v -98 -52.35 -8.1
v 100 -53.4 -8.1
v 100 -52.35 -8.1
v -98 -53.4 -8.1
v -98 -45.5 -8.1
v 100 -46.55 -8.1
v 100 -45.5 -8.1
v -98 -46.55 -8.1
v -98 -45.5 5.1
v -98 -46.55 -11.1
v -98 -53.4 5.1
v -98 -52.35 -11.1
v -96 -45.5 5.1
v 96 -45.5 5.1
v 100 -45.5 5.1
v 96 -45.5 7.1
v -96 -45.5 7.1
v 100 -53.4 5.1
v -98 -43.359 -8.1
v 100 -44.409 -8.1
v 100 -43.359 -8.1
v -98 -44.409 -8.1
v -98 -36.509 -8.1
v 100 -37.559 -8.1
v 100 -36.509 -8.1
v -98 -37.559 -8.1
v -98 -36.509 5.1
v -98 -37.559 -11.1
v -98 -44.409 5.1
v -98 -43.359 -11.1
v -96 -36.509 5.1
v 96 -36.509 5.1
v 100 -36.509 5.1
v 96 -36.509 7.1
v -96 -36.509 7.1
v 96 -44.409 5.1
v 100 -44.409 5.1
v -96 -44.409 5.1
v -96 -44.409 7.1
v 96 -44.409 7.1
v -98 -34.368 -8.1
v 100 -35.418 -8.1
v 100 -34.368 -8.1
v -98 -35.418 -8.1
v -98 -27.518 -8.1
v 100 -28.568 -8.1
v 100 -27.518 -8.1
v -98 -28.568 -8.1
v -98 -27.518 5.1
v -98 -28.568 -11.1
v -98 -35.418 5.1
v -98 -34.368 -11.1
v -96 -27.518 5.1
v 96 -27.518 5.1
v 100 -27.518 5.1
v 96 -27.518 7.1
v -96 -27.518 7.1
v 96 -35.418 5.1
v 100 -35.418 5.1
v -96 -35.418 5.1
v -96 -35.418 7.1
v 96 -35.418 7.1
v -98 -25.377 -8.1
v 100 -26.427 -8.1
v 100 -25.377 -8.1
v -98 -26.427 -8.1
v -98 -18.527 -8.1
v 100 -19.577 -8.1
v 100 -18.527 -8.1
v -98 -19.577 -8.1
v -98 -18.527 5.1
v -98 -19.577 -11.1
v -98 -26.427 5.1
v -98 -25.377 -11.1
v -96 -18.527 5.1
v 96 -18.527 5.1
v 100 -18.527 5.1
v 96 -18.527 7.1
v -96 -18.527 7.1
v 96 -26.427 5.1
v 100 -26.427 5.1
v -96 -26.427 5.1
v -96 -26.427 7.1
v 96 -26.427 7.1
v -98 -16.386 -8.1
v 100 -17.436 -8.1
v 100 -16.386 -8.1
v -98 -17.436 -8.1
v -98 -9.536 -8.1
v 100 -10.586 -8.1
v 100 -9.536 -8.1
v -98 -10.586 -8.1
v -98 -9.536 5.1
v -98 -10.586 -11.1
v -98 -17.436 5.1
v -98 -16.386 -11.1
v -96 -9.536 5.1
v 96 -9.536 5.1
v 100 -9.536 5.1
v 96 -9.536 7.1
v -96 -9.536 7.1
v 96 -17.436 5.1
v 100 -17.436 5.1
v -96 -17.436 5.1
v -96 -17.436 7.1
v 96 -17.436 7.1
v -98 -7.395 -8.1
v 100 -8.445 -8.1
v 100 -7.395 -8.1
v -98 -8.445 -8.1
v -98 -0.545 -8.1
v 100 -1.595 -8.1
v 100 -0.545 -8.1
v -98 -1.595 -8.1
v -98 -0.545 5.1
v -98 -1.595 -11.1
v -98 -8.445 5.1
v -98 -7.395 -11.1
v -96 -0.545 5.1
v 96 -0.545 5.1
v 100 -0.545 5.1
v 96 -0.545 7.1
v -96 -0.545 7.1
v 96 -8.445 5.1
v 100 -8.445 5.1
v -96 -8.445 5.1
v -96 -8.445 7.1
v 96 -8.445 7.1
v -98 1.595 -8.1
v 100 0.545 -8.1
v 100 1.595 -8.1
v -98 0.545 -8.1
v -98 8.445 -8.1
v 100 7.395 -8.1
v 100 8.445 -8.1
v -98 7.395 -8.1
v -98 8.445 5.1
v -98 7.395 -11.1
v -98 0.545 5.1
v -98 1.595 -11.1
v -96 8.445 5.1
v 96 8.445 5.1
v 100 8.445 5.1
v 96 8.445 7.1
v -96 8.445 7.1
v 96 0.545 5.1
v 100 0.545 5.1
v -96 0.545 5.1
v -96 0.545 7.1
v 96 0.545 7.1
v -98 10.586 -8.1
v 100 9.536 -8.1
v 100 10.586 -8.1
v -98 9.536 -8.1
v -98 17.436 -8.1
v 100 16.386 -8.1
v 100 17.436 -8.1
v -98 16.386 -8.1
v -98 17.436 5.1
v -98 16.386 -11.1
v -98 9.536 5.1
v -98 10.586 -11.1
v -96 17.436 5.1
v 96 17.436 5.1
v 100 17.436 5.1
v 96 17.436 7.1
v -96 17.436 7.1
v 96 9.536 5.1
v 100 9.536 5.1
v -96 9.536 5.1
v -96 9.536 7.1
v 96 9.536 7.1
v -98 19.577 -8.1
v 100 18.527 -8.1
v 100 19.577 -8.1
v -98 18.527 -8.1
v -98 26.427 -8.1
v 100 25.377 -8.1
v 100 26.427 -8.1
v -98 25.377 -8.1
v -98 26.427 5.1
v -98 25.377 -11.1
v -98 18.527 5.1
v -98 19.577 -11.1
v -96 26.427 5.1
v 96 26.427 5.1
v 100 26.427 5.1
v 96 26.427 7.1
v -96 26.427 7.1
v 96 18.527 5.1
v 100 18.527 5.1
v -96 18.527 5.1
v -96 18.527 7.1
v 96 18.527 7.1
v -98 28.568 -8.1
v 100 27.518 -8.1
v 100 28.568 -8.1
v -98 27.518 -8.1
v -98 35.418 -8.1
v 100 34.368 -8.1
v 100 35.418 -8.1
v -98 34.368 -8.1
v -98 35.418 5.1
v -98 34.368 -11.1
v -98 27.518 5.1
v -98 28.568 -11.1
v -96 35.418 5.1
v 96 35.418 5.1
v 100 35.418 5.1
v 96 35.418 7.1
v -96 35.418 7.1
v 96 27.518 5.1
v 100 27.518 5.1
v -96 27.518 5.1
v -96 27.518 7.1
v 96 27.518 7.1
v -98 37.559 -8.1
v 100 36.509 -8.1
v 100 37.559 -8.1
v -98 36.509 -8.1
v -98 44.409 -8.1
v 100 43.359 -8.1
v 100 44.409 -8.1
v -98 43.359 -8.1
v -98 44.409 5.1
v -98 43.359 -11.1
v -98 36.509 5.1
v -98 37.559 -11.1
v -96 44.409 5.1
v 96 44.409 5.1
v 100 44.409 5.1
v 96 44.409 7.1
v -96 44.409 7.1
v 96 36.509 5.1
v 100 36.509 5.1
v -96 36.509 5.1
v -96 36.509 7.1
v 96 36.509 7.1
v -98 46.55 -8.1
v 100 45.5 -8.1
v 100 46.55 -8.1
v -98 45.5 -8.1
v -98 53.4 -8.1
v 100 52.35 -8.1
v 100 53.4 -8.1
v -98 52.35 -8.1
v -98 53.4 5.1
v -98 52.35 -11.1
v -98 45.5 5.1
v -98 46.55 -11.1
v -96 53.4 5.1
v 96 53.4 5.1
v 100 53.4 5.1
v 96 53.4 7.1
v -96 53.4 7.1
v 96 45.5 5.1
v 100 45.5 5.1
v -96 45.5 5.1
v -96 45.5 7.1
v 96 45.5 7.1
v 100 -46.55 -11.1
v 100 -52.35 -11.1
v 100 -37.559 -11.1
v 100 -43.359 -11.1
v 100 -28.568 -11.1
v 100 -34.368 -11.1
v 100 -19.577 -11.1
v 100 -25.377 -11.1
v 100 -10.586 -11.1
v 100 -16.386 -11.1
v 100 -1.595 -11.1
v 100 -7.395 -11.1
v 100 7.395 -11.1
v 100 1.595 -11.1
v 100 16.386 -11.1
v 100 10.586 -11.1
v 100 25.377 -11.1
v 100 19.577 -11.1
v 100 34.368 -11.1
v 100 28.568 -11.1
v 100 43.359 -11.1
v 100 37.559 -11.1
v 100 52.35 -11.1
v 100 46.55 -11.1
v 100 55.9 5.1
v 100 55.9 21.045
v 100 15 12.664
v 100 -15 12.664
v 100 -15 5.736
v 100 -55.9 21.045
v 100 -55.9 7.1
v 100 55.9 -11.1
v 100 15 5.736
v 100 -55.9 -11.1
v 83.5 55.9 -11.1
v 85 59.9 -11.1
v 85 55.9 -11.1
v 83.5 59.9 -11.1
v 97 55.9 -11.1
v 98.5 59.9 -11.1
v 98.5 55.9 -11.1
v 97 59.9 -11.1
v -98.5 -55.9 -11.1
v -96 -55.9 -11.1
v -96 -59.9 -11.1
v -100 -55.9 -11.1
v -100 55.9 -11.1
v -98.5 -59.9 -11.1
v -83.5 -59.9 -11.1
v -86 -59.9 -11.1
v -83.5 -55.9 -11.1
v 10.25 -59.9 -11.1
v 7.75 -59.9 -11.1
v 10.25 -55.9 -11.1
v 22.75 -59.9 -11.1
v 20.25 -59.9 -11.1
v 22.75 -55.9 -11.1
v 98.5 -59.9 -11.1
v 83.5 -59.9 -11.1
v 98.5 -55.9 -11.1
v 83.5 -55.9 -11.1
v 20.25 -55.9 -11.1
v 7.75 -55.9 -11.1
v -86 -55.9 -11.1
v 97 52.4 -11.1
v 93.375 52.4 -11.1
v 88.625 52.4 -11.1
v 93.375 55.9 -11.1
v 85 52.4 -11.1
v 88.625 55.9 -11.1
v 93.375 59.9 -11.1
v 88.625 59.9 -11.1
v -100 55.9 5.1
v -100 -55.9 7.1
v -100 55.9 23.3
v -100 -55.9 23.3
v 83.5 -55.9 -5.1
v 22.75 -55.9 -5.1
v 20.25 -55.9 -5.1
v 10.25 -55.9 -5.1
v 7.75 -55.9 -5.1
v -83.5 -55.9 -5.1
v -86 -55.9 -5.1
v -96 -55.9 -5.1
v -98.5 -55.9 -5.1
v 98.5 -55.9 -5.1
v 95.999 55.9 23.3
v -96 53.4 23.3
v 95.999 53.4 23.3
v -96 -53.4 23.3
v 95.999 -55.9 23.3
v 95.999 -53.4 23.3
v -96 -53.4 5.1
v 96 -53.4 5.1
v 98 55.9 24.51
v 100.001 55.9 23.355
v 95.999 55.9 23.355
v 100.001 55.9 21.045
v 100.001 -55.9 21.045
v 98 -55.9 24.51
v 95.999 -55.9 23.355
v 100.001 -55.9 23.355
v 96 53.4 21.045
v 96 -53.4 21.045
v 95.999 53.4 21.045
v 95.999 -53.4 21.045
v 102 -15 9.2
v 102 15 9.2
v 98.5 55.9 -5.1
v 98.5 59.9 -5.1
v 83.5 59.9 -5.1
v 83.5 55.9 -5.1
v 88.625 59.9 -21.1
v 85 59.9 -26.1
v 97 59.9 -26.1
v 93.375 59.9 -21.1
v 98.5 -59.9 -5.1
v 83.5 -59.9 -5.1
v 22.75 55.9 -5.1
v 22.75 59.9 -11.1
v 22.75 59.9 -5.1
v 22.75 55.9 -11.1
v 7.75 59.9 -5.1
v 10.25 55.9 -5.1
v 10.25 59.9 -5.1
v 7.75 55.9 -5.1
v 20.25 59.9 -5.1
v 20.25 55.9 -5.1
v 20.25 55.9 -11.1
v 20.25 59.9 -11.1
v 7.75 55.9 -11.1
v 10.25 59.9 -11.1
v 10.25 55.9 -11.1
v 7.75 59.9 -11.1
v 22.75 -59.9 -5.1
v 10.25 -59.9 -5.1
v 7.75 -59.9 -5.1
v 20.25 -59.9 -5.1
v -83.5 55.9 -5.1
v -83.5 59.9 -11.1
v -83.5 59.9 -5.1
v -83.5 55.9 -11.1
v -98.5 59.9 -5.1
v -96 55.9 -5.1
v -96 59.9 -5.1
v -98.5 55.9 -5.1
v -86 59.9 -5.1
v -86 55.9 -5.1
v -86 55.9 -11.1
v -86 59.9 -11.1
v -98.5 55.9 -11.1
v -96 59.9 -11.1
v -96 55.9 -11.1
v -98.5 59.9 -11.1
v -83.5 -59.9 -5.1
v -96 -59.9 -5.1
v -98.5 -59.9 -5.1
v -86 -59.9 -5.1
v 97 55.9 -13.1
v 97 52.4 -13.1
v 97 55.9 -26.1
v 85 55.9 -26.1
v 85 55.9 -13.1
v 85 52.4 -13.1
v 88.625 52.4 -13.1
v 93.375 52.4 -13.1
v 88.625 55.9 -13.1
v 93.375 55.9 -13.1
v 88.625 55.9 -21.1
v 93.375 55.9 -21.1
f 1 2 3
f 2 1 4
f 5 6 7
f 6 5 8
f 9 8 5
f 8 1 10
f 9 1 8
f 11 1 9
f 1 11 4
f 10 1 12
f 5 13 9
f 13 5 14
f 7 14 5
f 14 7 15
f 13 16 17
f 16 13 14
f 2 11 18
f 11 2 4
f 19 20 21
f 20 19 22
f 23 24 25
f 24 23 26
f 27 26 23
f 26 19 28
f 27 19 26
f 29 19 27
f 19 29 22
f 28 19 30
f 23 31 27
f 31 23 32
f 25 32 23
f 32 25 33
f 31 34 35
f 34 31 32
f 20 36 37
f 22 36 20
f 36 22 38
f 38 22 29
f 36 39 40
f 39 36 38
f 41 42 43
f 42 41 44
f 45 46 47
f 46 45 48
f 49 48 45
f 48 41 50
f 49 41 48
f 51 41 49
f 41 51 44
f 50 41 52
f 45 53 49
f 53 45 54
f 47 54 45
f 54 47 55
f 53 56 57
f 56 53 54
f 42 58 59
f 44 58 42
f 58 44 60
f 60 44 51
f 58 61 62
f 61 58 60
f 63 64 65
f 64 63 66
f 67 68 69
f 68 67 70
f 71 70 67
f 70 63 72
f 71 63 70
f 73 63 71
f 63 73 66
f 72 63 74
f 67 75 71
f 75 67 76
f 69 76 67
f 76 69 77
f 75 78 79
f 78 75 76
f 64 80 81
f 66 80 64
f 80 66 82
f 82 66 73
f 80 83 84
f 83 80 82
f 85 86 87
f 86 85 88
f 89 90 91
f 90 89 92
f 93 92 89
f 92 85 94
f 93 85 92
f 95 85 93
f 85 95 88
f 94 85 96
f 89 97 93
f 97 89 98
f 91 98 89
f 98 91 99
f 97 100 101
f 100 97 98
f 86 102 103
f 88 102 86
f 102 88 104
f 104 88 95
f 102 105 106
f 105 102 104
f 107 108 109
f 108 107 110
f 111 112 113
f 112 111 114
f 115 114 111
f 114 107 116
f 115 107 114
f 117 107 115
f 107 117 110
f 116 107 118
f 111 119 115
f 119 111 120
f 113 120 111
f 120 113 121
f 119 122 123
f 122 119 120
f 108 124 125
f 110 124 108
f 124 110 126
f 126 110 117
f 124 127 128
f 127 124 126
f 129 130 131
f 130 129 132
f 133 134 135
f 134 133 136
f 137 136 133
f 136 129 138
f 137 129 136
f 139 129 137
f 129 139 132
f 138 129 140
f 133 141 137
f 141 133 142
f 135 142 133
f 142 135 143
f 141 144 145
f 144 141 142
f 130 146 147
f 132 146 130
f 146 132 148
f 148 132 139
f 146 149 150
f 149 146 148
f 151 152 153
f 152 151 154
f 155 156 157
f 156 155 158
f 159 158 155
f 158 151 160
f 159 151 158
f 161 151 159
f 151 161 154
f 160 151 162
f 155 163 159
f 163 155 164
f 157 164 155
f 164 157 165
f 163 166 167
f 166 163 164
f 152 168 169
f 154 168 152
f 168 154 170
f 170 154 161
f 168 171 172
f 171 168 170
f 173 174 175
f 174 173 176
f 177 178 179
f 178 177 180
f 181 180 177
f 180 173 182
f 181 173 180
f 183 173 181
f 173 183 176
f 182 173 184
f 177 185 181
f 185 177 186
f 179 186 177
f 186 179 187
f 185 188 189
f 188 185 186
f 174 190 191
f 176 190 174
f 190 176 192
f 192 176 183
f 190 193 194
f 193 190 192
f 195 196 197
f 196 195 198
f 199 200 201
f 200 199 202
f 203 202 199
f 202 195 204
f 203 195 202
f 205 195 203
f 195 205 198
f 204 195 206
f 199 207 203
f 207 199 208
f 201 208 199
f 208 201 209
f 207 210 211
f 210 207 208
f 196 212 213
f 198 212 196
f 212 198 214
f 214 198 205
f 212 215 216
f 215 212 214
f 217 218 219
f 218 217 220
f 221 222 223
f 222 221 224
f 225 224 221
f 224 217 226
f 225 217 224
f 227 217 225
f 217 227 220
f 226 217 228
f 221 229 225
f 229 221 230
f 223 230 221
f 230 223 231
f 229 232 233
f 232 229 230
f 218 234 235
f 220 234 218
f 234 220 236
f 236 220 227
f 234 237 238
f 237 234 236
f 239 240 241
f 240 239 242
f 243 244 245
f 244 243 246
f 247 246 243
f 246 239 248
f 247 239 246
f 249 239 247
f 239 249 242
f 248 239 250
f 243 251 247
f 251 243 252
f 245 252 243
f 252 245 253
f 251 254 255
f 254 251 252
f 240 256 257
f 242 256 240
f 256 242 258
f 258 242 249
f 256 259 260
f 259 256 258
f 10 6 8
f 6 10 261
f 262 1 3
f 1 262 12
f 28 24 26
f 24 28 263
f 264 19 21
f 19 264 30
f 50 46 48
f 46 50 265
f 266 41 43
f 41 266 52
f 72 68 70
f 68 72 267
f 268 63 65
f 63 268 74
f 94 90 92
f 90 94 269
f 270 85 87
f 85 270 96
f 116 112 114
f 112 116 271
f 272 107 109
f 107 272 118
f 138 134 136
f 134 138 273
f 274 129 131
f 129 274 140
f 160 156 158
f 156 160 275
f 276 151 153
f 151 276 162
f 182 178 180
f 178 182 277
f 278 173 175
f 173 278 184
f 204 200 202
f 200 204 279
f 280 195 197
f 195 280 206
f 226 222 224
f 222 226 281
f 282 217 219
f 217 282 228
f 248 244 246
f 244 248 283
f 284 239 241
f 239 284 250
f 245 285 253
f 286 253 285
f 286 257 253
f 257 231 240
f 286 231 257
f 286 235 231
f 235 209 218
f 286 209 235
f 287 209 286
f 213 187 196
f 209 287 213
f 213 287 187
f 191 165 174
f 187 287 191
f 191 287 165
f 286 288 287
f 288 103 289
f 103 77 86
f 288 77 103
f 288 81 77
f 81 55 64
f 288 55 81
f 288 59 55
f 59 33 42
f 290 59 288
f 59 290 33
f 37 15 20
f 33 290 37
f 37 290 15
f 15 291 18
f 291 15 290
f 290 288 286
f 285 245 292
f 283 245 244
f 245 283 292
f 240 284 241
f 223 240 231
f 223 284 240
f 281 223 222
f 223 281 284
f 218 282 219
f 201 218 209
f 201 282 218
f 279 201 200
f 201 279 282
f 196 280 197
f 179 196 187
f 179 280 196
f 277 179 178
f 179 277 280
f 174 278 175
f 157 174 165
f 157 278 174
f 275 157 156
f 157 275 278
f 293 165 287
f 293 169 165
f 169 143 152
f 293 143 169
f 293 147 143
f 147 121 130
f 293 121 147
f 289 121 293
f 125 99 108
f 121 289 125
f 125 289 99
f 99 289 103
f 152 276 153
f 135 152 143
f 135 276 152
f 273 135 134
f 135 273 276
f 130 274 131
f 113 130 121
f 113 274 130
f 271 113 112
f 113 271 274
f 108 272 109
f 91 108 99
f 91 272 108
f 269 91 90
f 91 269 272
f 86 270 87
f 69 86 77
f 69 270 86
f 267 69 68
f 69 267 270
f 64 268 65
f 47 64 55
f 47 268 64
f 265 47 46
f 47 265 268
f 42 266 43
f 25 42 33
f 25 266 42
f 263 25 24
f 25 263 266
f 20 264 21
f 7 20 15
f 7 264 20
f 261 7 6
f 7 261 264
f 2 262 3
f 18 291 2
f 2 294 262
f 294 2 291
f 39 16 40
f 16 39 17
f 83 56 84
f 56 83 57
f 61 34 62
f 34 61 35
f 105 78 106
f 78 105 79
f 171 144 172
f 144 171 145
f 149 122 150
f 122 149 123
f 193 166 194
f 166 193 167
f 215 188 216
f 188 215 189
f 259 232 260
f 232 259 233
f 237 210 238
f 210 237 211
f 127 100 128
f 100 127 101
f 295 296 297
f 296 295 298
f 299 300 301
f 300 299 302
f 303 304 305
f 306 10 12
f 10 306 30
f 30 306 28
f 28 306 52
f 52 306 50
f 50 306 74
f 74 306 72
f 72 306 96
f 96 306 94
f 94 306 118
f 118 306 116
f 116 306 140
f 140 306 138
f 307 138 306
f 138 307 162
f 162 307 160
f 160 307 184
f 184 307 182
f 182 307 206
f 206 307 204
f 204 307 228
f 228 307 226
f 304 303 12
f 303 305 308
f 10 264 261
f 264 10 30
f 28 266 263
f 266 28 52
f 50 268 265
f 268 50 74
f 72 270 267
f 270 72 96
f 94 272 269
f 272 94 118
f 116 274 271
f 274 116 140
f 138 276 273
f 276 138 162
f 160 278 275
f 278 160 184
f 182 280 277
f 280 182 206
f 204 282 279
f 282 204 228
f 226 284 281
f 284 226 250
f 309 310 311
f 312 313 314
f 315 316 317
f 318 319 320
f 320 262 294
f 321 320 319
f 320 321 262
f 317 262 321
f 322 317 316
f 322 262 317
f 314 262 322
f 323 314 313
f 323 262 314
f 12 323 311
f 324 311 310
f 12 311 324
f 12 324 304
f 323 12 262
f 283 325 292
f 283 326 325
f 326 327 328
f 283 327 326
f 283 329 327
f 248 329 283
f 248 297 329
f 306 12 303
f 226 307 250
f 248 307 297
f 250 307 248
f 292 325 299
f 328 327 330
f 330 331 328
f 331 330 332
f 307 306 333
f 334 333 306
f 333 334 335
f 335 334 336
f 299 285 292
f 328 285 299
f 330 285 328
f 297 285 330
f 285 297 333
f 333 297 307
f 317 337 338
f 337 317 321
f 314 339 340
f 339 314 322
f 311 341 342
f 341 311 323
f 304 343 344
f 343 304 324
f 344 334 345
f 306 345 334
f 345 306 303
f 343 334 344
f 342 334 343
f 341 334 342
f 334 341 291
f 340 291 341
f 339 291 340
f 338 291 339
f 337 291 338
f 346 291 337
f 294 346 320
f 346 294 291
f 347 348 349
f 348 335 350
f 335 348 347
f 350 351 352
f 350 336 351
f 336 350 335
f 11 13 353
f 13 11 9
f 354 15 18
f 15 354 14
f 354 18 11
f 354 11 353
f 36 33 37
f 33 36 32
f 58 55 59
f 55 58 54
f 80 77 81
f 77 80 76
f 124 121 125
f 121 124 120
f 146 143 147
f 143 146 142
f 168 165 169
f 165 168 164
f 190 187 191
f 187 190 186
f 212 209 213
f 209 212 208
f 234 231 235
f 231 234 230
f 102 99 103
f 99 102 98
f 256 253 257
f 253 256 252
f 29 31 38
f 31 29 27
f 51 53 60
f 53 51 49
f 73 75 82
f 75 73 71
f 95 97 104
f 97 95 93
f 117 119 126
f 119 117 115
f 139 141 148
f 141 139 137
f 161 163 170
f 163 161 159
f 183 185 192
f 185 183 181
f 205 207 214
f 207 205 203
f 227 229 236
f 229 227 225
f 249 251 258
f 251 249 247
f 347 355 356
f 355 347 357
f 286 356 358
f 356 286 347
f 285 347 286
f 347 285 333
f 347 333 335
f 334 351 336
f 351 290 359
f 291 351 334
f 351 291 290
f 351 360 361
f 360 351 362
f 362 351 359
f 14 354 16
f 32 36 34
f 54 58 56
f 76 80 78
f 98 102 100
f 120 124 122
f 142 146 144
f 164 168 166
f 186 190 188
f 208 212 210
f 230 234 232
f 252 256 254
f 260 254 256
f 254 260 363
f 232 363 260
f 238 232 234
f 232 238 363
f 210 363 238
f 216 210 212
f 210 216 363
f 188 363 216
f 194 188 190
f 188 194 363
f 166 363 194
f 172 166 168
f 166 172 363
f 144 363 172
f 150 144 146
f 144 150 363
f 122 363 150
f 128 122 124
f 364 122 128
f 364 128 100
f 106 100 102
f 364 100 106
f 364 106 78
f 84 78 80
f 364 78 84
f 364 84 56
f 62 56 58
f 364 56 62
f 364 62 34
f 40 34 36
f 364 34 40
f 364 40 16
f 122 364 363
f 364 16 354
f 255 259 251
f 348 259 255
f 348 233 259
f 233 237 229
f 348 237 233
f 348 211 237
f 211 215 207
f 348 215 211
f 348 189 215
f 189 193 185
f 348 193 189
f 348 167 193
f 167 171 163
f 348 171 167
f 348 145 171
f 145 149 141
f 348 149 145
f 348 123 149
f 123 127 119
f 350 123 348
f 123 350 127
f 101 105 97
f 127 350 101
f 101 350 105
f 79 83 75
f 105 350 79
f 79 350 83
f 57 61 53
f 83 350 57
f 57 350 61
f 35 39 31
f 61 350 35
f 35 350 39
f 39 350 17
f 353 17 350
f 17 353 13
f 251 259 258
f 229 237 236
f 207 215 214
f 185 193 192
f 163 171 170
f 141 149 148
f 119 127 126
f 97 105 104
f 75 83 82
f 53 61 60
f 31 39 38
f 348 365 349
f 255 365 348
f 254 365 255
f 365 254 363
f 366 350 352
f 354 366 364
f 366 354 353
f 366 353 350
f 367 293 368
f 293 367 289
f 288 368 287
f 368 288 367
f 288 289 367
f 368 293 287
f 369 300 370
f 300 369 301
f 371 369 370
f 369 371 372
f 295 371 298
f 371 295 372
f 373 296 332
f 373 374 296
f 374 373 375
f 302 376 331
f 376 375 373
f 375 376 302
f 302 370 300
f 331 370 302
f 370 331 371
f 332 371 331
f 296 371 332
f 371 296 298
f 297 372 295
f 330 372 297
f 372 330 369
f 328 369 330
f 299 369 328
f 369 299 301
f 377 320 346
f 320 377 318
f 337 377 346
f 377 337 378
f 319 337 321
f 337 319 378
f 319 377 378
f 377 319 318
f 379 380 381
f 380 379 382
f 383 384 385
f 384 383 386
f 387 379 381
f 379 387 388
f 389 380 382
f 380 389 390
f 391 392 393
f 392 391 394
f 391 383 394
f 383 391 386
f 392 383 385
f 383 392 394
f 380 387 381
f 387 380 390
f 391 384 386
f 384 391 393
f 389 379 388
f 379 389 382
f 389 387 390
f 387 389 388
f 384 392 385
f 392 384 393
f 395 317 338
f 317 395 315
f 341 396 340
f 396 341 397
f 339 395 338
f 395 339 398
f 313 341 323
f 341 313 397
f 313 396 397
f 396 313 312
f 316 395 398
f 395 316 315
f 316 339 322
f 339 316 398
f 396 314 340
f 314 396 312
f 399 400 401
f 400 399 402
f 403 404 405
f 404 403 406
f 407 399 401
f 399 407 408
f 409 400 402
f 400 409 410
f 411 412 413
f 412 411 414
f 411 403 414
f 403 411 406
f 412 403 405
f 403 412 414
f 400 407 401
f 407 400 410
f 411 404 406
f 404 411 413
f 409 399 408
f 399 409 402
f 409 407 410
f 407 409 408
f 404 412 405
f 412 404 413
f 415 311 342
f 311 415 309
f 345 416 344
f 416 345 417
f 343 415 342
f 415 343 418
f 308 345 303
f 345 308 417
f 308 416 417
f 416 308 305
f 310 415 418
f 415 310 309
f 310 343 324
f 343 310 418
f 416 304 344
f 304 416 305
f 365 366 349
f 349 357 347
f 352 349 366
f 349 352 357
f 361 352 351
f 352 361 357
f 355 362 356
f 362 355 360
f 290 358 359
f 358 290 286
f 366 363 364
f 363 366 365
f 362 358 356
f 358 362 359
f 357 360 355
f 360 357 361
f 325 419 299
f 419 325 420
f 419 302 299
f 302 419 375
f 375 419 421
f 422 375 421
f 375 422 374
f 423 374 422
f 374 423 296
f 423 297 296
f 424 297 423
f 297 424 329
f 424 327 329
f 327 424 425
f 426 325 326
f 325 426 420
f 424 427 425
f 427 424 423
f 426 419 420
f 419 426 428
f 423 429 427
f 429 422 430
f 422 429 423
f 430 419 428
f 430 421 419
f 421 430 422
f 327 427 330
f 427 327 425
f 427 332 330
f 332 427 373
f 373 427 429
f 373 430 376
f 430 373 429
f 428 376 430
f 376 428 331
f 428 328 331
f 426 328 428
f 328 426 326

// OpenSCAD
// Pipette details - check the pipette_tip model looks like your real pipette
top_d = 7.5;
top_h = 16.2;
lip_d = 5.8;
lower_d = 4.75;
lower_h = 34.5;

// Cassette details - check it doesn't look wrong
rows = 8;
columns = 12;
rows_outer = 106.8; // from outer edge to outer edge of a single row
cols_outer = 71; // same for columns
hole_d = 7.9;


module pipette_tip(top_d, top_h, lip_d, lower_d, lower_h, $fn=30){
    cylinder(h=top_h, d1=lip_d, d2=top_d);
    translate([0,0,-lower_h])cylinder(h=lower_h, d1=0,d2=lower_d);
}//end pipette tip

//pipette_tip(top_d,top_h,lip_d,lower_d,lower_h);

module cassette(rows,columns,outer_r,outer_c,hole_d,h=10){
    spacing_r = (outer_c - hole_d)/rows;
    spacing_c = (outer_r - hole_d)/columns;
    
    difference(){
        translate([-(h+hole_d)/2,-(h+hole_d)/2,0]){cube([outer_c+h,outer_r+h, h]);}
    for(i=[0:1:rows]){
        for (j=[0:1:columns]){
            translate([i*spacing_r, j*spacing_c,0])cylinder(d=hole_d,h=2.5*h,center=true);
        }//end for
    }//end for
    
}//end difference
}//end cassette

//translate([]){rotate([0,0,90])cassette(rows,columns,rows_outer,cols_outer,hole_d);}



module bars(rows,width,outer_c,height,length){
    spacing = (outer_c - hole_d)/(rows-1);
    for(i=[0:1:rows-1]){
        translate([0,i*spacing,0])cube([length,width,height],center=true);
    }//end for
}//end bars

module sorter_box(length){
    translate([0,-(rows_outer-hole_d)/2,0])difference(){
        translate([0,(rows_outer)/2-hole_d/2,-2])cube([length,rows_outer+5,top_h+2],center=true);
        translate([2,0,0])bars(columns, hole_d, rows_outer,top_h,length);
        translate([2,0,-(top_h+2)/2])bars(columns, lip_d, rows_outer,top_h+2,length);
    }//end difference
    translate([0,0,(top_h-2)])difference(){
        cube([length,rows_outer+5,top_h+2],center=true);
        cube([length-8,rows_outer,top_h+2],center=true);
    }//end difference
    rotate([90,90,0])translate([-top_h-6,length/2-2,0])cylinder(r=2.31,h=rows_outer+5,$fn=6,center=true);
    difference(){
        translate([length/2-2,0,top_h-7])rotate([90,0,0])cylinder(r=4,h=30,$fn=6,center=true);
        translate([0,0,(top_h-2)])cube([length-8,rows_outer,top_h+2],center=true);
    }//end difference
    
//base feet
    difference(){
        translate([length/2-9,rows_outer/2+4.5,-top_h/2])cube([15,4,6],center=true);
        translate([length/2-9,rows_outer/2+4.5,-top_h/2])cube([10,4,6],center=true);
    }//end difference
    difference(){
        translate([length/2-9,-rows_outer/2-4.5,-top_h/2])cube([15,4,6],center=true);
        translate([length/2-9,-rows_outer/2-4.5,-top_h/20])cube([10,4,6],center=true);
    }//end difference
    difference(){
        translate([(length/2-9)-cols_outer-lower_d,rows_outer/2+4.5,-top_h/2])cube([15,4,6],center=true);
        translate([(length/2-9)-cols_outer-lower_d,rows_outer/2+4.5,-top_h/2])cube([10,4,6],center=true);
    }//end difference
    difference(){
        translate([(length/2-9)-cols_outer-lower_d,-rows_outer/2-4.5,-top_h/2])cube([15,4,6],center=true);
        translate([(length/2-9)-cols_outer-lower_d,-rows_outer/2-4.5,-top_h/2])cube([10,4,6],center=true);
    }//end difference
    difference(){
        translate([-length/2+9,rows_outer/2+4.5,-top_h/2])cube([15,4,6],center=true);
        translate([-length/2+9,rows_outer/2+4.5,-top_h/2])cube([10,4,6],center=true);
    }//end difference
    difference(){
        translate([-length/2+9,-rows_outer/2-4.5,-top_h/2])cube([15,4,6],center=true);
        translate([-length/2+9,-rows_outer/2-4.5,-top_h/2])cube([10,4,6],center=true);
    }//end difference




}//end sorter box

sorter_box(200);

comb_height = 10;

module feet(length){
    translate([length/2-9,rows_outer/2+4.5,-top_h/2])cube([10,4,6],center=true);
    difference(){
        translate([length/2-9,rows_outer/2+2.75,-top_h/2-10.5])cube([12,7.5,15],center=true);
        translate([length/2-9,rows_outer/2-1,-top_h/2-12.5])cube([18,7,15],center=true);
        translate([length/2-9,rows_outer/2+2.75,-top_h/2-8])rotate(90)bars(1, lower_d, cols_outer,comb_height,top_d);
        
    
        
        
        
        
        
        }//end difference
}//end feet

feet(200);
module door(){
    difference(){
        translate([lower_h*3+30,0,top_h/2+0.2])cube([lower_d,rows_outer+5,top_h*2+4],center=true);
        translate([rows_outer+22.4,0,top_h-7])rotate([90,0,0])cylinder(r=4,h=30,$fn=6,center=true);
    }//end difference
    difference (){
        translate([129.2,0,24.9])cube([4,rows_outer+5,3.2],center=true);
        rotate([90,90,0])translate([-top_h-6,129.2,0])cylinder(r=2.31,h=rows_outer+5,$fn=6,center=true);
    }//end difference
}//end door
 
//door();

module comb(length, channel_w){
    handle=19;
    difference(){
        translate([-length/4,0,0])cube([length*1.5,cols_outer+6,comb_height],center=true);
        translate([0,-cols_outer/2 + hole_d/2,0])bars(rows, channel_w, cols_outer,top_h,length*2);
        translate([-length/2,cols_outer/2+3,-comb_height/2]){rotate([0,0,155])cube([length/2,cols_outer+50,comb_height]);}
    }//end difference
    translate([length/2,0,0])cube([4.75,cols_outer+15,comb_height],center=true);
    difference(){
        translate([(length/2)+14,0,0])cube([handle+5,cols_outer-20,comb_height],center=true);
        translate([(length/2)+11,0,0])cube([handle,cols_outer-30,comb_height],center=true);
    }//end difference
}//end comb
//comb(rows_outer*1.2, lower_d);
